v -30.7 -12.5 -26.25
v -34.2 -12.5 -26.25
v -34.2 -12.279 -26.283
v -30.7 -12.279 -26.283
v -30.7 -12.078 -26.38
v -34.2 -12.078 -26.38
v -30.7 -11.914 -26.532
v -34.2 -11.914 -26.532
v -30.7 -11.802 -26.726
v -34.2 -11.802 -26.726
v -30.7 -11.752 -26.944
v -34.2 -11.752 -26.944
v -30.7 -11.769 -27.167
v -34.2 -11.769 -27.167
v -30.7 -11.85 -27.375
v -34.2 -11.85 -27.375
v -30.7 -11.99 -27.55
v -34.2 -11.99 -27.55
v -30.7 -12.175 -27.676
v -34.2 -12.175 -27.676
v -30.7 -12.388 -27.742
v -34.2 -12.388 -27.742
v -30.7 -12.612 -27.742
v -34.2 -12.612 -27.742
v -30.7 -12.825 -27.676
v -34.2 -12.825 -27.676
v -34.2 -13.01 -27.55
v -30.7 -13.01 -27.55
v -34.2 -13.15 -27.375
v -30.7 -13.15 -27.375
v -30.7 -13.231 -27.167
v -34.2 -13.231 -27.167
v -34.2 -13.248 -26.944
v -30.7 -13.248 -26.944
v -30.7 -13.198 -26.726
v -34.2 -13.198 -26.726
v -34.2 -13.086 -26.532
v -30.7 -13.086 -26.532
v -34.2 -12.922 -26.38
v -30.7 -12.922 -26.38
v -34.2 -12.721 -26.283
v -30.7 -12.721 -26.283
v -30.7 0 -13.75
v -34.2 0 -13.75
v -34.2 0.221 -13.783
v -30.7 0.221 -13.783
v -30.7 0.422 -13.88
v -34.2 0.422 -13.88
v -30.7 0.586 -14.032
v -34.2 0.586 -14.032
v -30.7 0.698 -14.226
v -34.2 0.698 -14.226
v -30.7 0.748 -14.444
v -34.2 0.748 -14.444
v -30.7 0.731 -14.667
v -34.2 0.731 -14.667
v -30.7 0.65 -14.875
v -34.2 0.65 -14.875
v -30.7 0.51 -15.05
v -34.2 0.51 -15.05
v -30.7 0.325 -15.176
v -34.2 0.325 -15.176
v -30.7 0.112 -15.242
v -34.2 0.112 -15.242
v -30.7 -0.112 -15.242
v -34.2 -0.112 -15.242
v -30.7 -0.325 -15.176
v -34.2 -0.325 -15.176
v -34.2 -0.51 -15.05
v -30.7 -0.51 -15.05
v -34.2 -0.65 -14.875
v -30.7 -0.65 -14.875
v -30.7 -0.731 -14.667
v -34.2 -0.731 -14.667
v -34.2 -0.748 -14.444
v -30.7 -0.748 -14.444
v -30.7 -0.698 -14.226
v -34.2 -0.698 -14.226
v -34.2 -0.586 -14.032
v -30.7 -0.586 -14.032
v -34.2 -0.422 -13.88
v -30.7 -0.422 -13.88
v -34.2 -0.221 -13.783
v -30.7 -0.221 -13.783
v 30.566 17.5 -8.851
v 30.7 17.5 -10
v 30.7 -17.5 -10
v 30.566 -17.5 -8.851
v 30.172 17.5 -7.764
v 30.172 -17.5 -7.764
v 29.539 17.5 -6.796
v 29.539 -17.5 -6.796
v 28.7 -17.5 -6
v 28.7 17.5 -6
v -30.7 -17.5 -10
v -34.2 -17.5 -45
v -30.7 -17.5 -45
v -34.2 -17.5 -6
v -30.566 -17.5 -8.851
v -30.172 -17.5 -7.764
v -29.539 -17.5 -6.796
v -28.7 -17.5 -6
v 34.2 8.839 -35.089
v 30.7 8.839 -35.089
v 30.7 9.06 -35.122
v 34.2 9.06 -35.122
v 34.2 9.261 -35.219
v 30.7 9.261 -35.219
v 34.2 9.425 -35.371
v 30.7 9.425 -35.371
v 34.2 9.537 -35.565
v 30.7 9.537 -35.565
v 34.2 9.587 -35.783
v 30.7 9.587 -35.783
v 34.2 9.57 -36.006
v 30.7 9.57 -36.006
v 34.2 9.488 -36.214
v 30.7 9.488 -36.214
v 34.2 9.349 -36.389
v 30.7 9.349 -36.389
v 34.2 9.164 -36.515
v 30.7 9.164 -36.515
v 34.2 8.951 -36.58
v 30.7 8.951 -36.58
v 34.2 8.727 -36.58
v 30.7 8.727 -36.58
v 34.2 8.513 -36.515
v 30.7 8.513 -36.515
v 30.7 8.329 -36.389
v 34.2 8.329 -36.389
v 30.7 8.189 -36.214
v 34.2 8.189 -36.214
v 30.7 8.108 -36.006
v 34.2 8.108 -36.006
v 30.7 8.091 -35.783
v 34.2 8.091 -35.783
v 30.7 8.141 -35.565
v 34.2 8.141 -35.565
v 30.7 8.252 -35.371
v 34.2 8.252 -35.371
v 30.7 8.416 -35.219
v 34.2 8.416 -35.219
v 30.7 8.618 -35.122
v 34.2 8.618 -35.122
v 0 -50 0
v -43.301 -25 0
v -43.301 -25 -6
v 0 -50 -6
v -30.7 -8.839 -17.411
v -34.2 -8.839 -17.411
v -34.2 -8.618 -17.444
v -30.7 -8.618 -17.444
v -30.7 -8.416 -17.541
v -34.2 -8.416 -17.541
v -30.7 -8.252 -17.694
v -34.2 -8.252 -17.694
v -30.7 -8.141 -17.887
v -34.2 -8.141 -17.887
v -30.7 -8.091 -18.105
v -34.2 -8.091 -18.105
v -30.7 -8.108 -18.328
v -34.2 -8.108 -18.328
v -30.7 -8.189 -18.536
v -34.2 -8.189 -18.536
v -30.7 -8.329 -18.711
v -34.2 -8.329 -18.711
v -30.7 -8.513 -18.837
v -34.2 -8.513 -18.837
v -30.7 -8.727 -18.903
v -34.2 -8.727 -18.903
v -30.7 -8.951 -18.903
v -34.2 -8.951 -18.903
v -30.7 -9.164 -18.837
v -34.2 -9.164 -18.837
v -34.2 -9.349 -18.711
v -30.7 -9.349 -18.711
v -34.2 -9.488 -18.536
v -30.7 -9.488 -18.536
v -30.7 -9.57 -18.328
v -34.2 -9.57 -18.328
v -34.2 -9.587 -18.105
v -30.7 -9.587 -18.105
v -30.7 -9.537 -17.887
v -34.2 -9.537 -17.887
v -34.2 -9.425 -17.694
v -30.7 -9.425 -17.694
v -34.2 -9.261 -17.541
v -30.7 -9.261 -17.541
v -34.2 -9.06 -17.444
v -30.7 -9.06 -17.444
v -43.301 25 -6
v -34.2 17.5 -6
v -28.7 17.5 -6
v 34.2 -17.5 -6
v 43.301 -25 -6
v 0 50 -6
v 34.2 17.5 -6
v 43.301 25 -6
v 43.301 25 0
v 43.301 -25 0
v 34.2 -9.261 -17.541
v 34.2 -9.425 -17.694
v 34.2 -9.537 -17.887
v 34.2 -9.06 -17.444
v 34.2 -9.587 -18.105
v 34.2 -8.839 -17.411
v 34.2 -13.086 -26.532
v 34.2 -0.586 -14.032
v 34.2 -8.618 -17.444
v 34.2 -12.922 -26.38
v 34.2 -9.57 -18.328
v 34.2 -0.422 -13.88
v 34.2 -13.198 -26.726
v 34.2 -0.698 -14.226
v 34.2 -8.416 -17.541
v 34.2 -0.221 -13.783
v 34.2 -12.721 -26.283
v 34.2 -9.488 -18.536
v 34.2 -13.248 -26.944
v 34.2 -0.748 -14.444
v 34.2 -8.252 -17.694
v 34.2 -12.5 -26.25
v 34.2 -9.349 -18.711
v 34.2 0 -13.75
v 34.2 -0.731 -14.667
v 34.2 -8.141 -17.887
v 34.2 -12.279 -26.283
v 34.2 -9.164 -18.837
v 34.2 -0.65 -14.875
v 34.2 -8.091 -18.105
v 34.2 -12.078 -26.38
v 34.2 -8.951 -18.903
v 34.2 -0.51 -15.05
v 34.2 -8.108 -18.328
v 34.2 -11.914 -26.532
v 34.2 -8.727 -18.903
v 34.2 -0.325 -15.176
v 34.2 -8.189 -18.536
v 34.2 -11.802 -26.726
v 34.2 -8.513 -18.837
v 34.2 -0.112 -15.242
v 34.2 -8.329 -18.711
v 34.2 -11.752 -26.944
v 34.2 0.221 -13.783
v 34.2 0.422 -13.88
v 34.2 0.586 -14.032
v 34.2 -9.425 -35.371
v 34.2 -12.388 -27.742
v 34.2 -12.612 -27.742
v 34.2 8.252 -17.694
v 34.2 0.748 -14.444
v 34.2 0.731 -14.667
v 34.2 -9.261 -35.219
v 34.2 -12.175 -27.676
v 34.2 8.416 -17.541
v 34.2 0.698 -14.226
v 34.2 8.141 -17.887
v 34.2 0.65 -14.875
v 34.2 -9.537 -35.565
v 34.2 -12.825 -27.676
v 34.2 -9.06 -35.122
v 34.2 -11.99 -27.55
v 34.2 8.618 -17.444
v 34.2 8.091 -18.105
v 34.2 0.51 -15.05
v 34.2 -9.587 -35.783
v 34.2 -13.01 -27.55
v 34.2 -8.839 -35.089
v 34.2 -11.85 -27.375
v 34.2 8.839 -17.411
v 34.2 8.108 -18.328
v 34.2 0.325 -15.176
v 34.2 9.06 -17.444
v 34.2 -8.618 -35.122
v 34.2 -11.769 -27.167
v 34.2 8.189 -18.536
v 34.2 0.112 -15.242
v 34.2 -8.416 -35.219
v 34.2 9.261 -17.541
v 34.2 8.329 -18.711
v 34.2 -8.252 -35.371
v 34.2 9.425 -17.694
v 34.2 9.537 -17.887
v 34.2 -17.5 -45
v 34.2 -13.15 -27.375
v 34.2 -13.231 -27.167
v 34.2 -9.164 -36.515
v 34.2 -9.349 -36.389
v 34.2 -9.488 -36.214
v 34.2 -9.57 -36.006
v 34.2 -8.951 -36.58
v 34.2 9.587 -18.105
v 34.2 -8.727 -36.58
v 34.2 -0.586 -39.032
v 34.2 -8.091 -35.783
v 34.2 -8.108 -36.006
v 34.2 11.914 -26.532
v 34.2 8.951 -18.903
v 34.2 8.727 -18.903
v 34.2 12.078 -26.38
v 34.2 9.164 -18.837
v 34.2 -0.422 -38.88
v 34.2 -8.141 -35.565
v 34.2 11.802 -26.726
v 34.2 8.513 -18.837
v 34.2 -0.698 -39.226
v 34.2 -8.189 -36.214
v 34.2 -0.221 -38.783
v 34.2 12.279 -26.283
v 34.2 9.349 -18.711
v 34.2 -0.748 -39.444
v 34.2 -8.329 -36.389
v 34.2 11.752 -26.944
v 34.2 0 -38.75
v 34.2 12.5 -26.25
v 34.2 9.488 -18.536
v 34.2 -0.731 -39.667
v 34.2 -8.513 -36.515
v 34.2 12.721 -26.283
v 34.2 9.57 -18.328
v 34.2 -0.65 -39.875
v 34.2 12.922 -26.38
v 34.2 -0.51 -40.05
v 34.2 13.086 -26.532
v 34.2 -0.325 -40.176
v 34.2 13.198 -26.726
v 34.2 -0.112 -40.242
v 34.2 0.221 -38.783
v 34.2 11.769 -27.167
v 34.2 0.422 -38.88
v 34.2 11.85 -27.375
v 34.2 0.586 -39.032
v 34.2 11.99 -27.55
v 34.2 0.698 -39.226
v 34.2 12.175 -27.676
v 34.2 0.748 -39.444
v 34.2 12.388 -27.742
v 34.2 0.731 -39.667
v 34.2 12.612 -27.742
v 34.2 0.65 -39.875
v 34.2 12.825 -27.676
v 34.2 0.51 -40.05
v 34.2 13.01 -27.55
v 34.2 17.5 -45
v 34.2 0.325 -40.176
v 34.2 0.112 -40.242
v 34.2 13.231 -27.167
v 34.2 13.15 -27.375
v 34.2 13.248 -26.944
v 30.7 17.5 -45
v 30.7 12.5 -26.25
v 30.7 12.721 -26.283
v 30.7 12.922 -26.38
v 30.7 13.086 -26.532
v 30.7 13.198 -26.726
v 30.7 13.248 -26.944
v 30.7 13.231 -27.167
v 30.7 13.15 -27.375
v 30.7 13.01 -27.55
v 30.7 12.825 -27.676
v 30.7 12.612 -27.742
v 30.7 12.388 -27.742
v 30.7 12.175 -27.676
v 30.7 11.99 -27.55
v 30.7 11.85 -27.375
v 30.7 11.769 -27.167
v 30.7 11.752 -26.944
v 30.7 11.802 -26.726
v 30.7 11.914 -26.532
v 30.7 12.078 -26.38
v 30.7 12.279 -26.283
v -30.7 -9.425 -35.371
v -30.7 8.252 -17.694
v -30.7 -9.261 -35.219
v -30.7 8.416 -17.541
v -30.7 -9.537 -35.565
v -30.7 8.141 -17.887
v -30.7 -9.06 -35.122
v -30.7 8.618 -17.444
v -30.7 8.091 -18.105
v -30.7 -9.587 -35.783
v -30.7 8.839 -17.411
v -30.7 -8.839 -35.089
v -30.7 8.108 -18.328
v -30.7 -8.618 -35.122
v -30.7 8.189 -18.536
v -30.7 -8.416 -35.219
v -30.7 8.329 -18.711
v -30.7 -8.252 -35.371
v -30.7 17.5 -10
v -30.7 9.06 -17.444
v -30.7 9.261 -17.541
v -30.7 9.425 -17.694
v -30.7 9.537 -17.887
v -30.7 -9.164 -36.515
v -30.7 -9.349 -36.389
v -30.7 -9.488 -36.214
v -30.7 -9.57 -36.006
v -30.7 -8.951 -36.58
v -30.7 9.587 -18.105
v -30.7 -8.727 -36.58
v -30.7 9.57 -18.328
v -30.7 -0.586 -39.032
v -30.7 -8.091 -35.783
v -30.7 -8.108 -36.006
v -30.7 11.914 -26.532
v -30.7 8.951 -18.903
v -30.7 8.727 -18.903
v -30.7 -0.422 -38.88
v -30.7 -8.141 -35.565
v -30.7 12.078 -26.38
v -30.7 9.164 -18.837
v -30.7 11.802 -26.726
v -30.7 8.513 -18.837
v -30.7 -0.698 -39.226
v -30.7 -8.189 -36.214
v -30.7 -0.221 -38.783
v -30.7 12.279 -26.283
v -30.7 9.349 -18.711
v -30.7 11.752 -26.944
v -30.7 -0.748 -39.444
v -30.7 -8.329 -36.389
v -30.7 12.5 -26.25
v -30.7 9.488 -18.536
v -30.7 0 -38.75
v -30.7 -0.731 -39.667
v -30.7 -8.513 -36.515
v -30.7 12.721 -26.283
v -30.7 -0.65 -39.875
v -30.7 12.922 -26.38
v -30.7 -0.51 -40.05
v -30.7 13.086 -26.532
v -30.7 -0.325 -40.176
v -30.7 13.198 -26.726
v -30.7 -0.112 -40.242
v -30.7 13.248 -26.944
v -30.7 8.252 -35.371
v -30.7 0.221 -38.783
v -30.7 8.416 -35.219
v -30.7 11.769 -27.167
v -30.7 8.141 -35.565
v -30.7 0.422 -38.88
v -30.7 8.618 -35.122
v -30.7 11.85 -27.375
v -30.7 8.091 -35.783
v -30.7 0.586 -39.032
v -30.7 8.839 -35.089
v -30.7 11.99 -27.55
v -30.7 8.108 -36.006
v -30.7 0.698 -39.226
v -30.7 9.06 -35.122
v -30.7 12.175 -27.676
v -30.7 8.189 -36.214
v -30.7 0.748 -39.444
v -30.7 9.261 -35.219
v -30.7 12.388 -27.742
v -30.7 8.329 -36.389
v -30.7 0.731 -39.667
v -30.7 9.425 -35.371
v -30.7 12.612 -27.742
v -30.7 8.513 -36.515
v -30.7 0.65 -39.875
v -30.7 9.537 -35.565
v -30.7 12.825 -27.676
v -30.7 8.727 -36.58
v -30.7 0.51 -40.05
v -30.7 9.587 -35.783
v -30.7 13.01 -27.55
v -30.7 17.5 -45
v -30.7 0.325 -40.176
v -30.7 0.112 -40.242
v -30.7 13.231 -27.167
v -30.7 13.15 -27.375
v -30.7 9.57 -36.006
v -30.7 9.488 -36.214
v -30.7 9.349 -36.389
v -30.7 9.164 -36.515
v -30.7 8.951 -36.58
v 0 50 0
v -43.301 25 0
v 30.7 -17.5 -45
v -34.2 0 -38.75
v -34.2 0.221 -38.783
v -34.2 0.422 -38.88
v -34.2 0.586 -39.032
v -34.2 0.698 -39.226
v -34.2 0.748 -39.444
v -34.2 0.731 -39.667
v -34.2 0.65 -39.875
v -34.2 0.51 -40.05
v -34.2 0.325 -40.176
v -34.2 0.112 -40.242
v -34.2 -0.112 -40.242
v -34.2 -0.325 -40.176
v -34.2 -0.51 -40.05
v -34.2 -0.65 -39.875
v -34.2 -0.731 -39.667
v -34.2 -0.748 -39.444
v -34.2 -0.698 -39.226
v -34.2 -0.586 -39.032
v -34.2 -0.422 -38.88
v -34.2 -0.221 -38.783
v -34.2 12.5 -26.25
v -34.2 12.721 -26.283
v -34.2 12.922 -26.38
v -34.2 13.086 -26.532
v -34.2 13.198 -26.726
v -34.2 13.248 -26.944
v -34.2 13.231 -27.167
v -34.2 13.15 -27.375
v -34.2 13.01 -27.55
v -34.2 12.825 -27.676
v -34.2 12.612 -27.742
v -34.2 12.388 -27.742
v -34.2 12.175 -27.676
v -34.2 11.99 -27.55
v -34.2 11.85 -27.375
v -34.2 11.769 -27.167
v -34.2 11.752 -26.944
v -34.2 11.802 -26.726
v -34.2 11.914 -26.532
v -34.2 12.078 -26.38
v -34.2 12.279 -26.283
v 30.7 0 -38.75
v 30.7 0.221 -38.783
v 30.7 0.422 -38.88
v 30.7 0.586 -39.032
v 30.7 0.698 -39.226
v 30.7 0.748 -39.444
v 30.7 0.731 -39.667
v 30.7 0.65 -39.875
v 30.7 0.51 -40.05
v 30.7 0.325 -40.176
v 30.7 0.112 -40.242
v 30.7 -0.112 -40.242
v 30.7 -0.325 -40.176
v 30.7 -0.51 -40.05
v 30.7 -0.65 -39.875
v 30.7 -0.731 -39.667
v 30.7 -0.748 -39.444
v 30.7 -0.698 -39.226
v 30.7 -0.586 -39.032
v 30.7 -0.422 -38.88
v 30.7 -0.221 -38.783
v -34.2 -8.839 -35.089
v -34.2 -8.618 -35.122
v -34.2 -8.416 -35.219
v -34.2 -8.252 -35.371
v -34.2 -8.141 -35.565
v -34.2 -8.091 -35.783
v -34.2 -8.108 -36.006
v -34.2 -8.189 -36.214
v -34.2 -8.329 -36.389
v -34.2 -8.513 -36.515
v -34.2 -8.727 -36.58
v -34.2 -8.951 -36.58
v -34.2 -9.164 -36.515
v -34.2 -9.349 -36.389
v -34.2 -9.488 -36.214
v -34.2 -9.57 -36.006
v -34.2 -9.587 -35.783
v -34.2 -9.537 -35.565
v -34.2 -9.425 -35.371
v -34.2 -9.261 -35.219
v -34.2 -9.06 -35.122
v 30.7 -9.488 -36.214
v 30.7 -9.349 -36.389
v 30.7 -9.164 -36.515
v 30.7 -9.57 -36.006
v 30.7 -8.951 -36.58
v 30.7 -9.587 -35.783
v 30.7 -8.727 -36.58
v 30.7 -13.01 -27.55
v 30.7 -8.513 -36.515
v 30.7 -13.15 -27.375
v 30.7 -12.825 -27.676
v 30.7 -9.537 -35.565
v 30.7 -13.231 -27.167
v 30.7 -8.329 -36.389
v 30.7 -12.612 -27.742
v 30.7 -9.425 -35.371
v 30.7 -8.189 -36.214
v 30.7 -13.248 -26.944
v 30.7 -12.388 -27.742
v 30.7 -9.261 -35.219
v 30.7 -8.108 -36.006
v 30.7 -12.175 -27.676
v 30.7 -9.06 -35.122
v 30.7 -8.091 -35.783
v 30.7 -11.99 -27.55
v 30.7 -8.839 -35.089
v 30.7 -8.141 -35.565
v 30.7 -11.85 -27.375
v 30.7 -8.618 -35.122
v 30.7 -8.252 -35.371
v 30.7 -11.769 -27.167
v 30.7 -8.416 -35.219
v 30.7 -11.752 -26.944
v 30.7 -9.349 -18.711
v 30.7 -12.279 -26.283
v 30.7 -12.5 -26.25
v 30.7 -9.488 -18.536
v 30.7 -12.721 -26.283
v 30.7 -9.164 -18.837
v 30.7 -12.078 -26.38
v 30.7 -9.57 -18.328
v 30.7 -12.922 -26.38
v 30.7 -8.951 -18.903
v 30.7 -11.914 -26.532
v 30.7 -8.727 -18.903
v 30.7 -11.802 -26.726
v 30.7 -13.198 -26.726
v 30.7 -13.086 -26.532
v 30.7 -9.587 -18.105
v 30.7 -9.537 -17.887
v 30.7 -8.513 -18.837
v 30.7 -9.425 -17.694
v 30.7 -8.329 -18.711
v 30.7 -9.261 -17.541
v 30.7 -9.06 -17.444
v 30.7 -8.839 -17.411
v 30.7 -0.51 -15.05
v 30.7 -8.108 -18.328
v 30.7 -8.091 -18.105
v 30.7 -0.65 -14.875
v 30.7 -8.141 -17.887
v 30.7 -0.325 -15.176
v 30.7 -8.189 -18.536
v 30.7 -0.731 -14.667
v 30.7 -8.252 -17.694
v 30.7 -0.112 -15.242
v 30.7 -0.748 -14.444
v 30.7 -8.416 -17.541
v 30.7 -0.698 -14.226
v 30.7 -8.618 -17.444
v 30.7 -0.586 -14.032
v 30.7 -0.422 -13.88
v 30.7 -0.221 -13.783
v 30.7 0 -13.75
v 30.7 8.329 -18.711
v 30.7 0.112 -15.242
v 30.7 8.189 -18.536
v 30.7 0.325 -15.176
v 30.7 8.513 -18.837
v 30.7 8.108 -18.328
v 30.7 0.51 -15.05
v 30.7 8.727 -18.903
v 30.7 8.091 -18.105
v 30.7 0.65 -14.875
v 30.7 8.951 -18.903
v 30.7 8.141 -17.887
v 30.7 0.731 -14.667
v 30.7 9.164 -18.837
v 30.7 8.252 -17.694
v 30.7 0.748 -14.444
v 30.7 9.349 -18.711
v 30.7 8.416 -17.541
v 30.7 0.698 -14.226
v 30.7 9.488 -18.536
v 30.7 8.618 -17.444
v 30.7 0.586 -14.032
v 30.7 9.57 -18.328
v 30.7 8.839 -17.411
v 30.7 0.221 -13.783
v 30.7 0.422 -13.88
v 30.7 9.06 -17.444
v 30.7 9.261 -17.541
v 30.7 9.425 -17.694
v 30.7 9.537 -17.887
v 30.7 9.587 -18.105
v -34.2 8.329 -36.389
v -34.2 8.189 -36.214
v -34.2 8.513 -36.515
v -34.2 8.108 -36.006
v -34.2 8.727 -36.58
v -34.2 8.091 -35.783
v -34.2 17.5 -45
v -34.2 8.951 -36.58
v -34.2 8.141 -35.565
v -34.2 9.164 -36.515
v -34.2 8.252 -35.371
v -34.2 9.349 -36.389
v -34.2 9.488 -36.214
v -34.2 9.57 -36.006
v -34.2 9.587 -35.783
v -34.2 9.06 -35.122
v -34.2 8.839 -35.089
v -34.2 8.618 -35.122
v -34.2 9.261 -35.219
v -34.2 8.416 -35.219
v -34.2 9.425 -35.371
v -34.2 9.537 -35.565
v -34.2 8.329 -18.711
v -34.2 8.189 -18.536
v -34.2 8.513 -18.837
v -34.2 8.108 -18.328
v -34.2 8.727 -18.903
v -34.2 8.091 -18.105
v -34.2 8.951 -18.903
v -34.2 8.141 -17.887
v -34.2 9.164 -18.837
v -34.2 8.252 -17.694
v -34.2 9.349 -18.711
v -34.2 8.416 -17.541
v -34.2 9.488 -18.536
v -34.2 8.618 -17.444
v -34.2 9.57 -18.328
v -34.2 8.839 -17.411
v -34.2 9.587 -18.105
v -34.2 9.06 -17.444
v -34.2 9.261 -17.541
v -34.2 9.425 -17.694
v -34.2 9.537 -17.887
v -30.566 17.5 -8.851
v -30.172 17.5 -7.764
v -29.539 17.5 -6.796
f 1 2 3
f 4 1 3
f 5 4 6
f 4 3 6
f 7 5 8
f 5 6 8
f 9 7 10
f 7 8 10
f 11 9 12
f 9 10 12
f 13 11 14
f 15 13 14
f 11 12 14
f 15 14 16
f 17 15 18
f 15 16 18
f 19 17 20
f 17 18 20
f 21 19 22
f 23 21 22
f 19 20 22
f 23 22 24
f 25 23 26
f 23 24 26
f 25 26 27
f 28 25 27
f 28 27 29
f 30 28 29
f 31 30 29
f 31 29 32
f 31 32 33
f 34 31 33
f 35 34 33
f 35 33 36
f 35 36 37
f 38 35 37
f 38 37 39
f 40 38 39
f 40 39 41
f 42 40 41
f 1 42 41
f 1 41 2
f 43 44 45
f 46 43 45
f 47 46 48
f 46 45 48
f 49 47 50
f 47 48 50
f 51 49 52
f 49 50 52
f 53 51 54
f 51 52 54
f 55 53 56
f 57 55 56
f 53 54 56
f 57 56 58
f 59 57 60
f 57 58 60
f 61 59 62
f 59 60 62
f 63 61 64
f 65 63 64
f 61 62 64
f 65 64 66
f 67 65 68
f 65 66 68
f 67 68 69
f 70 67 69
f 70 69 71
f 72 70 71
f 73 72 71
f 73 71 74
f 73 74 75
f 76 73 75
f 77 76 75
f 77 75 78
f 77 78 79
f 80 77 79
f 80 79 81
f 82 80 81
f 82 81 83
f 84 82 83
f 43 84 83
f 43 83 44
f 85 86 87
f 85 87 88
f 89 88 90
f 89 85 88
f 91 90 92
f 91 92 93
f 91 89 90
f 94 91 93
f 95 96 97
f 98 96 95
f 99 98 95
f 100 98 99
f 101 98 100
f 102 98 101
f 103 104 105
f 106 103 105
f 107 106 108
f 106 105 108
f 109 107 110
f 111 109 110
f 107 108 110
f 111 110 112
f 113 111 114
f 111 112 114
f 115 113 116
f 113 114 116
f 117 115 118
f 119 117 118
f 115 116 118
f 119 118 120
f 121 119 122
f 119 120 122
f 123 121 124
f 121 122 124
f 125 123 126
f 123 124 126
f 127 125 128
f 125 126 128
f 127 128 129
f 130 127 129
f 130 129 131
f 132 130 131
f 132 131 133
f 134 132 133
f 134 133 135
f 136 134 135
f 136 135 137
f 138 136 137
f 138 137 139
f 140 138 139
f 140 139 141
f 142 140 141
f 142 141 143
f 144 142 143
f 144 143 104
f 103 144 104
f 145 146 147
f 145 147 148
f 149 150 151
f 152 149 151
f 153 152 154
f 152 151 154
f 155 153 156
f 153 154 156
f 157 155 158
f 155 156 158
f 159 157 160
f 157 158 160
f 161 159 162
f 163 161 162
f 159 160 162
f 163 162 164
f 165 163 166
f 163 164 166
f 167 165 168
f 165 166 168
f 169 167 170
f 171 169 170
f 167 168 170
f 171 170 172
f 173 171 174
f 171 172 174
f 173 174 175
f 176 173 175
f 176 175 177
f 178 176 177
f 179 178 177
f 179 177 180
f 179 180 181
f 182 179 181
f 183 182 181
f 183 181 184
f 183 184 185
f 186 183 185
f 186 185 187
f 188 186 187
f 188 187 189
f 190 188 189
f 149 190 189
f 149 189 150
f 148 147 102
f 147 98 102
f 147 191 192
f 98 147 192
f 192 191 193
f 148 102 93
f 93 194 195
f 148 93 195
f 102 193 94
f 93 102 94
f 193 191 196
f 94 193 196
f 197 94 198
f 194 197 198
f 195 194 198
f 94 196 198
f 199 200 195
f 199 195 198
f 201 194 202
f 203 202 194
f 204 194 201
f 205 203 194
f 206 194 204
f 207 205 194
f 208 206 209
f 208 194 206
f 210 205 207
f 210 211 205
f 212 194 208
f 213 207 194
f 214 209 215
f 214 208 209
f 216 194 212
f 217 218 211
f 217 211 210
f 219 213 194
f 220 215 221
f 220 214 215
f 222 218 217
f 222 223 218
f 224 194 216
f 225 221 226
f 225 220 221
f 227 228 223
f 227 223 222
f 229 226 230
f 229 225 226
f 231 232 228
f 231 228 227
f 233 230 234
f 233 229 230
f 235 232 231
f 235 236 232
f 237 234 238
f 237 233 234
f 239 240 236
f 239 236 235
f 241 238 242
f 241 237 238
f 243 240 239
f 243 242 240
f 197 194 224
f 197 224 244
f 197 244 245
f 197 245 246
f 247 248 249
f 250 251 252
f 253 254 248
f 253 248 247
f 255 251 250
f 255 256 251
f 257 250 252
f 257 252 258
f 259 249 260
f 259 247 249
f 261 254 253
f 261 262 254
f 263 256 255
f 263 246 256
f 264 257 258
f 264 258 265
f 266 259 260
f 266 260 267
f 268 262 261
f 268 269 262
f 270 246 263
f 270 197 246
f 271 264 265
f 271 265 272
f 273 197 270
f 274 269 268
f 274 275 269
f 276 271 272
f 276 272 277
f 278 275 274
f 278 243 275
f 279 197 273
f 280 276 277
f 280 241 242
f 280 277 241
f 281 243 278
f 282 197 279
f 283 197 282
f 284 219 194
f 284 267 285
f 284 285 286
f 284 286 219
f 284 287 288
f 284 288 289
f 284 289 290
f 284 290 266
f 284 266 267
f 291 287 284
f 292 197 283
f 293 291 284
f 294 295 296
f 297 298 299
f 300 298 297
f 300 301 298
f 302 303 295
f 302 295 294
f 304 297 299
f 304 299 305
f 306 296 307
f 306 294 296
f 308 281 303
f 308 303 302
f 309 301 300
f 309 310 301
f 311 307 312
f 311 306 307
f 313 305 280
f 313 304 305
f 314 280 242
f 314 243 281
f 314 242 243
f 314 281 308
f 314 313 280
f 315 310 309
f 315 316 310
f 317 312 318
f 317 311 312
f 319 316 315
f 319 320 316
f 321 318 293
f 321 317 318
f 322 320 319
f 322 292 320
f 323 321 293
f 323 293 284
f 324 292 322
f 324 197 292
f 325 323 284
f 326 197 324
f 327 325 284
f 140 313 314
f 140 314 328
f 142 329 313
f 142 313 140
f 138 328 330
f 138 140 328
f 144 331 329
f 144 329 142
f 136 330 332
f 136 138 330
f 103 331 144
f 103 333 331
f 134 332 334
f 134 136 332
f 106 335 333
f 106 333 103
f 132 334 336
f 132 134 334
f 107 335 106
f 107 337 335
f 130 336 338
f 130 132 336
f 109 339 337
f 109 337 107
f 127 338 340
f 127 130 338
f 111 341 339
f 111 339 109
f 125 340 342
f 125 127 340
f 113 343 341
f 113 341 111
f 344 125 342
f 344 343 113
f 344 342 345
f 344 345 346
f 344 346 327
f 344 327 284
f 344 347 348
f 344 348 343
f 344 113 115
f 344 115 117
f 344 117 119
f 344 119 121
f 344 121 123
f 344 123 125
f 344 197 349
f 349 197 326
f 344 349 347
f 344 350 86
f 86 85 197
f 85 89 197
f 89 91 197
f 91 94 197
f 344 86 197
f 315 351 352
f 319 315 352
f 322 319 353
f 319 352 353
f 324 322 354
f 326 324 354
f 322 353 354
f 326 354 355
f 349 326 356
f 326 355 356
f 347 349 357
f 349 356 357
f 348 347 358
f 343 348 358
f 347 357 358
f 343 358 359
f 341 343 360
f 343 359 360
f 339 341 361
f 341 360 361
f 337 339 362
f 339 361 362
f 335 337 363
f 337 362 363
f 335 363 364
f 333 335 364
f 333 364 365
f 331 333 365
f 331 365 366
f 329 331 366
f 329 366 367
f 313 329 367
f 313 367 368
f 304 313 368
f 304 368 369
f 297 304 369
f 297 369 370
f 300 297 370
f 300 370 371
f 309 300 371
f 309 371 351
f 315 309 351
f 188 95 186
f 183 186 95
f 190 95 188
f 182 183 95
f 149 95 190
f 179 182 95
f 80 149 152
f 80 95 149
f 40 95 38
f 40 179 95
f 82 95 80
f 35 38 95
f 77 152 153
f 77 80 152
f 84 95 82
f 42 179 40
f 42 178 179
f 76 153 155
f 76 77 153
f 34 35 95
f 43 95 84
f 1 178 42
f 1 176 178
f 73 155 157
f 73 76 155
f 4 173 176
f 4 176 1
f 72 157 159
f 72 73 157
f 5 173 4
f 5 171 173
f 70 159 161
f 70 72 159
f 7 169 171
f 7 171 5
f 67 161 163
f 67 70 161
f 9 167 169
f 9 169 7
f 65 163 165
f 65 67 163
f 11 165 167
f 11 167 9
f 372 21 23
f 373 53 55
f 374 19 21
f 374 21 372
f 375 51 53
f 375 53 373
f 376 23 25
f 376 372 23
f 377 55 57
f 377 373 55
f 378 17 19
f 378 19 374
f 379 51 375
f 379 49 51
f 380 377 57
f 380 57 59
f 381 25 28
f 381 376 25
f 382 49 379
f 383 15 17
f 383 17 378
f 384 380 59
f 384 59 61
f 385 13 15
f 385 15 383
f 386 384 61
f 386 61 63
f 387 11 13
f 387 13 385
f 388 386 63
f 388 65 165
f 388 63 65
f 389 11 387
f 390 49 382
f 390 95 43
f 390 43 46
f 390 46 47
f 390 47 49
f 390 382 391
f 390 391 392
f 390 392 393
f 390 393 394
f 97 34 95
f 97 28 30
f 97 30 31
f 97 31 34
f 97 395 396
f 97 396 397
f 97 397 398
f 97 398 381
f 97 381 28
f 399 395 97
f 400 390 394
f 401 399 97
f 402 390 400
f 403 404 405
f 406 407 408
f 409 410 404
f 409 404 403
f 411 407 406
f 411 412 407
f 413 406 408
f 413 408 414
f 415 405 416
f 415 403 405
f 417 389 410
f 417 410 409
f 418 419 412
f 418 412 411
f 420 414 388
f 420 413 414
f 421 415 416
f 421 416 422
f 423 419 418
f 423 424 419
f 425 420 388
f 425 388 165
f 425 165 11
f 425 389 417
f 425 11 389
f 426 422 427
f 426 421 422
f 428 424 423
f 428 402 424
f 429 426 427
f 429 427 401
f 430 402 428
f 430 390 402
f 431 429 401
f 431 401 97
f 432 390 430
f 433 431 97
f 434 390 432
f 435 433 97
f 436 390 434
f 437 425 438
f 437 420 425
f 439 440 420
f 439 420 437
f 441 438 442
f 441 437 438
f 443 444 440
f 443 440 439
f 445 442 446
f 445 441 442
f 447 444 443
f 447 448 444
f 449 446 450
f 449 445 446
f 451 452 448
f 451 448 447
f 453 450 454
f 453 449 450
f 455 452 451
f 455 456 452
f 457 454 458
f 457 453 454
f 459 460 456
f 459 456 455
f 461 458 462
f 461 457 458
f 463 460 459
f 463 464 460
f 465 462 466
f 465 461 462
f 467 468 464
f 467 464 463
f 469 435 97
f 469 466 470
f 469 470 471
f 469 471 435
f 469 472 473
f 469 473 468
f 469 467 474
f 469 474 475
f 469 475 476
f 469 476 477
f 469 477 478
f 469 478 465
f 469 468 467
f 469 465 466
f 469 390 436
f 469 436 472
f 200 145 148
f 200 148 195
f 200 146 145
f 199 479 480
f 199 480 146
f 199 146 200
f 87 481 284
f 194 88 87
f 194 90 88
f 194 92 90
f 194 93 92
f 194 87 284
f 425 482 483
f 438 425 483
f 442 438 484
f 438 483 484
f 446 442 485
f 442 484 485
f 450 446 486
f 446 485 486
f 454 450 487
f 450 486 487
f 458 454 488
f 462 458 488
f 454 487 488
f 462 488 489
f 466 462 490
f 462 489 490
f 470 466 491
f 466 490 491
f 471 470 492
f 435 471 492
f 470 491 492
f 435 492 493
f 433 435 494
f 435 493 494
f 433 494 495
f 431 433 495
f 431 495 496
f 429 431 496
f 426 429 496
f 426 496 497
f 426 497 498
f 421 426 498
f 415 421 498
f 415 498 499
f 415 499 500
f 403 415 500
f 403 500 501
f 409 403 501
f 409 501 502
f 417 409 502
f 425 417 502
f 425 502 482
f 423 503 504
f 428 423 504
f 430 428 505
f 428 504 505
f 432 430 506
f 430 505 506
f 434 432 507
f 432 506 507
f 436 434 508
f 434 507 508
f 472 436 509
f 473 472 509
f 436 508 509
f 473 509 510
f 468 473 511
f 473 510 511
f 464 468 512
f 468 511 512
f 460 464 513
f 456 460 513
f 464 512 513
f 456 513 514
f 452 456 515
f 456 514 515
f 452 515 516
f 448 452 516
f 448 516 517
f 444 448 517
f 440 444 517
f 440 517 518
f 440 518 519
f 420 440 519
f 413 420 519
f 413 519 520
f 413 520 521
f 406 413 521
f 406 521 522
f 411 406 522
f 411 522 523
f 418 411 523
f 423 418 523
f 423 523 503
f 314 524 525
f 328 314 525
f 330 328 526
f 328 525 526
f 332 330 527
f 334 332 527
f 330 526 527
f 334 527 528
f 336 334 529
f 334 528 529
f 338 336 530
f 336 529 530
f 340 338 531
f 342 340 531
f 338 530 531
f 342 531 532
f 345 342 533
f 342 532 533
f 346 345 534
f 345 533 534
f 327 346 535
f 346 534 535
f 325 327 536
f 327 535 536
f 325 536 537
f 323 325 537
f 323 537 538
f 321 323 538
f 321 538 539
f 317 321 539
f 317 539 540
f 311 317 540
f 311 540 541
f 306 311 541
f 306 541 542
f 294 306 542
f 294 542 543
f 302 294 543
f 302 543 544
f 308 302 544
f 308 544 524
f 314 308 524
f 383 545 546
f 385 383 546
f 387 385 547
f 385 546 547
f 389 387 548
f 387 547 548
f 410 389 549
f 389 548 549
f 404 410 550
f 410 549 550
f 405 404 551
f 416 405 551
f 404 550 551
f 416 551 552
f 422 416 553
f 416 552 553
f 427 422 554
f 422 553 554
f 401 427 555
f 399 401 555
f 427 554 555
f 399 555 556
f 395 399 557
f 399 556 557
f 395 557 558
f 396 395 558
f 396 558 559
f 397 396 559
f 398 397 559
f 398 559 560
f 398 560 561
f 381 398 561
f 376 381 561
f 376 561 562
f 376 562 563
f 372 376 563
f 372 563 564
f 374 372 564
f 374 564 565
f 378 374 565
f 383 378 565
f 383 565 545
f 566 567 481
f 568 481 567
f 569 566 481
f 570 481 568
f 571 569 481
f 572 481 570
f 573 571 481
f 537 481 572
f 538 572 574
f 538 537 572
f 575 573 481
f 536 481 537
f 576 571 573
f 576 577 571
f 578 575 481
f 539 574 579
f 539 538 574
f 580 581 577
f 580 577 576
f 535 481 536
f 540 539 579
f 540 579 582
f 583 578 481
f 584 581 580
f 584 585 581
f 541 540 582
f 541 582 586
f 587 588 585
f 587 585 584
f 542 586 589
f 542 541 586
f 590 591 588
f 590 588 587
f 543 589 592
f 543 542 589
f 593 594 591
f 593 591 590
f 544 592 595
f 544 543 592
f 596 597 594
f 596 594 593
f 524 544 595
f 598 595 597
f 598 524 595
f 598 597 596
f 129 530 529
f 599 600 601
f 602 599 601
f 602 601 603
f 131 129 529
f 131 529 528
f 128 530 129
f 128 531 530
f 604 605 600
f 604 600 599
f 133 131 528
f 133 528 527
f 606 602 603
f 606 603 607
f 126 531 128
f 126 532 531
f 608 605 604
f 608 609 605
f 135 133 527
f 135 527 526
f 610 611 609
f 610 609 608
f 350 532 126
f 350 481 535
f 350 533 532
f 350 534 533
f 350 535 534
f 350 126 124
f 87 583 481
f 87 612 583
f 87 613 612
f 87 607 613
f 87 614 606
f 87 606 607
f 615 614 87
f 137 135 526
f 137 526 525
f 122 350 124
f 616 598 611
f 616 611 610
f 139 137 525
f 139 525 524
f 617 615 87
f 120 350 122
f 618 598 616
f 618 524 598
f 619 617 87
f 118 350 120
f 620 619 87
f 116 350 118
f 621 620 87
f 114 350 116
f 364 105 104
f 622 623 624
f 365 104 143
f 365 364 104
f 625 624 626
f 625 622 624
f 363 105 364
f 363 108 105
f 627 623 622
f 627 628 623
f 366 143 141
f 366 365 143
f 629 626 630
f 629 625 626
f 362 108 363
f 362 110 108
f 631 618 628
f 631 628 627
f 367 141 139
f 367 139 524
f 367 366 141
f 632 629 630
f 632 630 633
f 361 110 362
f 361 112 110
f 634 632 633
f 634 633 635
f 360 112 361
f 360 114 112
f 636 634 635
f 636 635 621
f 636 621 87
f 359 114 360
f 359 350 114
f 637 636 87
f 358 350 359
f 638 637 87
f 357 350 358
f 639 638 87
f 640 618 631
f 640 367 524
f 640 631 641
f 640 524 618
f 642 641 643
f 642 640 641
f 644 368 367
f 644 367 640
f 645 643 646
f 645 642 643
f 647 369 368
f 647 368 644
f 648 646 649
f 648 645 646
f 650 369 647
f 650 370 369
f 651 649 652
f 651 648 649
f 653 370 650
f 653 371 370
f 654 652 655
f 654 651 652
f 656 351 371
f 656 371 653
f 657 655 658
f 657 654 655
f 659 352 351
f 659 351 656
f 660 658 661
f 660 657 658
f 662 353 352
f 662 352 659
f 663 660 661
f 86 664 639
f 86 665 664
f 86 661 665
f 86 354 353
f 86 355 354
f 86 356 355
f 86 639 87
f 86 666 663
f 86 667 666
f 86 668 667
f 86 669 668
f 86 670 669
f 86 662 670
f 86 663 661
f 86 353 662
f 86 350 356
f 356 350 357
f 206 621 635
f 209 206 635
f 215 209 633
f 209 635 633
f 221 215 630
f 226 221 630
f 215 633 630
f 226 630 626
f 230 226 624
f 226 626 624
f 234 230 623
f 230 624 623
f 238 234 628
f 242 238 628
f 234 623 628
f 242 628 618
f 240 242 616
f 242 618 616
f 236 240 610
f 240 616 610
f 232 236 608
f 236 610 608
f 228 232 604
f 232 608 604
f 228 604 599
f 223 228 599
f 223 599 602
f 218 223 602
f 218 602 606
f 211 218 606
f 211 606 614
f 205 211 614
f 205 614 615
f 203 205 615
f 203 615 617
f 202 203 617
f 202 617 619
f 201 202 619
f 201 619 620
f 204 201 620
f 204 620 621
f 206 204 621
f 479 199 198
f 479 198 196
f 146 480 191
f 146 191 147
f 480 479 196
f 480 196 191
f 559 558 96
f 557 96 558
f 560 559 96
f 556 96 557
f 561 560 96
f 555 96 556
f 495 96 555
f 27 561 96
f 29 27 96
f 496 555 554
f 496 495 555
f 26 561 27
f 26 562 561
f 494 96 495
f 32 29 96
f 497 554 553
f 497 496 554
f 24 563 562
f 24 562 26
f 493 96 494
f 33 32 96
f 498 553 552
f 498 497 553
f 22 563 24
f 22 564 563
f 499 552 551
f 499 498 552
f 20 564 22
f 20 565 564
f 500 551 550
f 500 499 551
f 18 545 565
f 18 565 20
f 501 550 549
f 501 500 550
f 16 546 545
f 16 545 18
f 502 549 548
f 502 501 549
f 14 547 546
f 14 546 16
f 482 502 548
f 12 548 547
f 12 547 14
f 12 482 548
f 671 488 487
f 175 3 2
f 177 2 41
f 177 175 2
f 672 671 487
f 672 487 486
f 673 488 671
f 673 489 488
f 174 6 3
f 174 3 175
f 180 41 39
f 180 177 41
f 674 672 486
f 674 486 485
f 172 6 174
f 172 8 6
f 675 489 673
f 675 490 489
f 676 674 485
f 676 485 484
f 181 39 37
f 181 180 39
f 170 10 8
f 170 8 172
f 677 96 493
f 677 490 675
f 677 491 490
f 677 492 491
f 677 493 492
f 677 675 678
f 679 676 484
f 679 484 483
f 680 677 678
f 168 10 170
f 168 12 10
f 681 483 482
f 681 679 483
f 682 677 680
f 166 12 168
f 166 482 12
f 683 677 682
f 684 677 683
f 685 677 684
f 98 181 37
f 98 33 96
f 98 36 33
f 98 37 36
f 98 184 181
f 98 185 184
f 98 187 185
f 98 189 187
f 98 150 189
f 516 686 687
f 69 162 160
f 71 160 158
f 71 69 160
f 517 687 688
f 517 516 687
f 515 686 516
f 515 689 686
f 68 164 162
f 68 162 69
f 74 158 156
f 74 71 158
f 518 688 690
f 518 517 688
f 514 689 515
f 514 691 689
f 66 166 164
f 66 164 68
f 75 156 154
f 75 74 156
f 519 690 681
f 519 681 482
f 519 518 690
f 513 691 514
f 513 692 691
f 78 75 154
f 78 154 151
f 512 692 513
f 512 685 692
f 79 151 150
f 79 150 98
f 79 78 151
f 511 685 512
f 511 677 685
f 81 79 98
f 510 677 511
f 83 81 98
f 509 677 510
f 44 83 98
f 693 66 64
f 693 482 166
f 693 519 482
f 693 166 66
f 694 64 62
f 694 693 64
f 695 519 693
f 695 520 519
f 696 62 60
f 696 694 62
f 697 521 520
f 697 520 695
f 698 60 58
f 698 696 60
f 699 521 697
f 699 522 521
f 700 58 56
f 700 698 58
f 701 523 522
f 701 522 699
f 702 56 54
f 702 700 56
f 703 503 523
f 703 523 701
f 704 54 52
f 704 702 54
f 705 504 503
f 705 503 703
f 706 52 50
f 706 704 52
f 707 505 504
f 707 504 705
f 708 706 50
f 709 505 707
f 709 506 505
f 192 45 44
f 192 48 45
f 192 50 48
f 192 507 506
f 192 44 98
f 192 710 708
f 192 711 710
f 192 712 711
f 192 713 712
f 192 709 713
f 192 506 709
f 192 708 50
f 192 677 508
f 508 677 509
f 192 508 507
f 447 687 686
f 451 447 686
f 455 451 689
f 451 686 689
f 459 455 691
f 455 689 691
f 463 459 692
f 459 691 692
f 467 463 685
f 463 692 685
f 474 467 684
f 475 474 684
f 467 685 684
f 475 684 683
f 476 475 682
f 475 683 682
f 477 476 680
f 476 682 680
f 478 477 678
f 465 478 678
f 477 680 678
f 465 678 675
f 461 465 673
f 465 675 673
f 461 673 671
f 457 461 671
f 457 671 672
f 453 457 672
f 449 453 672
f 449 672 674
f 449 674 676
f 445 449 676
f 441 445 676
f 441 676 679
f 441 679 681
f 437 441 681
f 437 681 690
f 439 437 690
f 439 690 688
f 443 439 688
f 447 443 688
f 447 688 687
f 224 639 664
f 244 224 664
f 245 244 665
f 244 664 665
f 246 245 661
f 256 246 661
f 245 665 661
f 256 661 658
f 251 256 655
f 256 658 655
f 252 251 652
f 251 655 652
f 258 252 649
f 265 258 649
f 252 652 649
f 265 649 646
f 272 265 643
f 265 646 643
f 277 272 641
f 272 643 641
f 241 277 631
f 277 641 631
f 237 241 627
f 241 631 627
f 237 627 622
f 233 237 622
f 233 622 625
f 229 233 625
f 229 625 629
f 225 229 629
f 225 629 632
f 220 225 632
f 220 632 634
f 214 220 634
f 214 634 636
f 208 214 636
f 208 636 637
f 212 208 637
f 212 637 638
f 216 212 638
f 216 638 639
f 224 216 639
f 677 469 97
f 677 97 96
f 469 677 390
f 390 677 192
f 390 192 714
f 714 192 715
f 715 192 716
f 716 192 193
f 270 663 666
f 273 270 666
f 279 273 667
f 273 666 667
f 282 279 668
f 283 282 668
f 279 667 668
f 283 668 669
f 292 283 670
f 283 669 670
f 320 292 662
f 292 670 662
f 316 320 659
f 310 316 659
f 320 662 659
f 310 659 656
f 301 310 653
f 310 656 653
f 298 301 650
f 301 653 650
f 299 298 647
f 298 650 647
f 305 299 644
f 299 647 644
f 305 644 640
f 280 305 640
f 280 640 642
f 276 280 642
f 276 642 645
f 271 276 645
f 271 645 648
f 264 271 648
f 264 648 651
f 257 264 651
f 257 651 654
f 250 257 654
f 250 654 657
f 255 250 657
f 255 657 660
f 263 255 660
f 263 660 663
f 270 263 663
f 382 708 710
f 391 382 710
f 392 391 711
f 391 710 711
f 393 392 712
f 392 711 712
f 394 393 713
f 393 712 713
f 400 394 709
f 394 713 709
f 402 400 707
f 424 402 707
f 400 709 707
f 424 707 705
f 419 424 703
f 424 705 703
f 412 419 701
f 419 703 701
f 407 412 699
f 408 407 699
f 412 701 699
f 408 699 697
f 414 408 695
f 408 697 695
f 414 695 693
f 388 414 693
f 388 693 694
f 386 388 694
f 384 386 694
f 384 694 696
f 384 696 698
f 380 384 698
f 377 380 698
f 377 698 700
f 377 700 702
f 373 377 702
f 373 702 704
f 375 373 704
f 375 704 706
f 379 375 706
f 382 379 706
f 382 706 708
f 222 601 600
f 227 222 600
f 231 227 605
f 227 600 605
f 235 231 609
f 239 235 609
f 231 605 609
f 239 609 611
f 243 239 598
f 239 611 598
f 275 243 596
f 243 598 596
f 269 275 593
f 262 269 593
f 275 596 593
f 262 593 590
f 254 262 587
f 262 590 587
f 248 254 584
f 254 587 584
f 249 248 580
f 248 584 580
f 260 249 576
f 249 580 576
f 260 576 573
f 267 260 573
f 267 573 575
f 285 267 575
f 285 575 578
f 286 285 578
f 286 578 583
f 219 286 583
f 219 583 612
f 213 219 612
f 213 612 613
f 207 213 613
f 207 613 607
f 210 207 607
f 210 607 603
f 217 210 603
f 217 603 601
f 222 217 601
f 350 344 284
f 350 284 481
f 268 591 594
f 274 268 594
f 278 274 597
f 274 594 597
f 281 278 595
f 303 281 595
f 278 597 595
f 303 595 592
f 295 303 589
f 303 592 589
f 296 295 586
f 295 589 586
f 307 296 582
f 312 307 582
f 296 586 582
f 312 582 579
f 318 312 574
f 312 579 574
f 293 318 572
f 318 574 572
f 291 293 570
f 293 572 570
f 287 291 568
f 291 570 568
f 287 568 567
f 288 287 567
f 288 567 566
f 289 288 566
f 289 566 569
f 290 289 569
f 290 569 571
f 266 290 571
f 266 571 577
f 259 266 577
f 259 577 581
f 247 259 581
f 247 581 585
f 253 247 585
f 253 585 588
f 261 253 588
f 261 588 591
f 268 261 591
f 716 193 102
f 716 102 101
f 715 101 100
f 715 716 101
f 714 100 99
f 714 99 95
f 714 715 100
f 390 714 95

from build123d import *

# Parameters (mm, degrees)
BOSS_EXTRUDE1_DEPTH = 17.5
SKETCH2_R           = 0.75
CUT_EXTRUDE1_DEPTH  = 68.4
SKETCH2_3_R         = 0.75
CUT_EXTRUDE2_DEPTH  = 69.4
SKETCH3_W           = 82.6
SKETCH3_H           = 35
BOSS_EXTRUDE2_DEPTH = 6
BOSS_EXTRUDE3_DEPTH = 6


with BuildPart() as part:
    # Sketch1 → Boss-Extrude1 (new body, symmetric)
    with BuildSketch(Plane(origin=(0, 0, 0), x_dir=(1, 0, 0), z_dir=(0, 1, 0))):
        with BuildLine():
            Line((-29.2, 0), (29.2, 0))
            ThreePointArc((29.2, 0), (32.735533906, 1.464466094), (34.2, 5))
            Line((34.2, 5), (34.2, 45))
            Line((34.2, 45), (30.7, 45))
            Line((30.7, 45), (30.7, 10))
            ThreePointArc((30.7, 10), (29.235533906, 6.464466094), (25.7, 5))
            Line((25.7, 5), (-25.7, 5))
            ThreePointArc((-25.7, 5), (-29.235533906, 6.464466094), (-30.7, 10))
            Line((-30.7, 10), (-30.7, 45))
            Line((-30.7, 45), (-34.2, 45))
            Line((-34.2, 45), (-34.2, 5))
            ThreePointArc((-34.2, 5), (-32.735533906, 1.464466094), (-29.2, 0))
        make_face()
    extrude(amount=BOSS_EXTRUDE1_DEPTH, both=True)

    # Sketch2 → Cut-Extrude1 (cut)
    with BuildSketch(Plane.ZY.offset(34.2)):
        with Locations((-27, 12.5)):
            Circle(SKETCH2_R)
        with Locations((-18.161165235, 8.838834765)):
            Circle(SKETCH2_R)
        with Locations((-14.5, 0)):
            Circle(SKETCH2_R)
        with Locations((-18.161165235, -8.838834765)):
            Circle(SKETCH2_R)
        with Locations((-35.838834765, -8.838834765)):
            Circle(SKETCH2_R)
        with Locations((-39.5, 0)):
            Circle(SKETCH2_R)
        with Locations((-35.838834765, 8.838834765)):
            Circle(SKETCH2_R)
    extrude(amount=-CUT_EXTRUDE1_DEPTH, mode=Mode.SUBTRACT)

    # Sketch2<3> → Cut-Extrude2 (cut, through all)
    with BuildSketch(Plane.ZY.offset(34.2)):
        with Locations((-27, -12.5)):
            Circle(SKETCH2_3_R)
    extrude(amount=-CUT_EXTRUDE2_DEPTH, mode=Mode.SUBTRACT)

    # Sketch3 → Boss-Extrude2 (add)
    with BuildSketch(Plane.XY):
        Rectangle(SKETCH3_W, SKETCH3_H)
    extrude(amount=-BOSS_EXTRUDE2_DEPTH)

    # Sketch5 → Boss-Extrude3 (add)
    with BuildSketch(Plane.XY):
        Polygon((43.301270189, 25), (0, 50), (-43.301270189, 25), (-43.301270189, -25), (0, -50), (43.301270189, -25), align=None)
    extrude(amount=-BOSS_EXTRUDE3_DEPTH)


solid = part.part
